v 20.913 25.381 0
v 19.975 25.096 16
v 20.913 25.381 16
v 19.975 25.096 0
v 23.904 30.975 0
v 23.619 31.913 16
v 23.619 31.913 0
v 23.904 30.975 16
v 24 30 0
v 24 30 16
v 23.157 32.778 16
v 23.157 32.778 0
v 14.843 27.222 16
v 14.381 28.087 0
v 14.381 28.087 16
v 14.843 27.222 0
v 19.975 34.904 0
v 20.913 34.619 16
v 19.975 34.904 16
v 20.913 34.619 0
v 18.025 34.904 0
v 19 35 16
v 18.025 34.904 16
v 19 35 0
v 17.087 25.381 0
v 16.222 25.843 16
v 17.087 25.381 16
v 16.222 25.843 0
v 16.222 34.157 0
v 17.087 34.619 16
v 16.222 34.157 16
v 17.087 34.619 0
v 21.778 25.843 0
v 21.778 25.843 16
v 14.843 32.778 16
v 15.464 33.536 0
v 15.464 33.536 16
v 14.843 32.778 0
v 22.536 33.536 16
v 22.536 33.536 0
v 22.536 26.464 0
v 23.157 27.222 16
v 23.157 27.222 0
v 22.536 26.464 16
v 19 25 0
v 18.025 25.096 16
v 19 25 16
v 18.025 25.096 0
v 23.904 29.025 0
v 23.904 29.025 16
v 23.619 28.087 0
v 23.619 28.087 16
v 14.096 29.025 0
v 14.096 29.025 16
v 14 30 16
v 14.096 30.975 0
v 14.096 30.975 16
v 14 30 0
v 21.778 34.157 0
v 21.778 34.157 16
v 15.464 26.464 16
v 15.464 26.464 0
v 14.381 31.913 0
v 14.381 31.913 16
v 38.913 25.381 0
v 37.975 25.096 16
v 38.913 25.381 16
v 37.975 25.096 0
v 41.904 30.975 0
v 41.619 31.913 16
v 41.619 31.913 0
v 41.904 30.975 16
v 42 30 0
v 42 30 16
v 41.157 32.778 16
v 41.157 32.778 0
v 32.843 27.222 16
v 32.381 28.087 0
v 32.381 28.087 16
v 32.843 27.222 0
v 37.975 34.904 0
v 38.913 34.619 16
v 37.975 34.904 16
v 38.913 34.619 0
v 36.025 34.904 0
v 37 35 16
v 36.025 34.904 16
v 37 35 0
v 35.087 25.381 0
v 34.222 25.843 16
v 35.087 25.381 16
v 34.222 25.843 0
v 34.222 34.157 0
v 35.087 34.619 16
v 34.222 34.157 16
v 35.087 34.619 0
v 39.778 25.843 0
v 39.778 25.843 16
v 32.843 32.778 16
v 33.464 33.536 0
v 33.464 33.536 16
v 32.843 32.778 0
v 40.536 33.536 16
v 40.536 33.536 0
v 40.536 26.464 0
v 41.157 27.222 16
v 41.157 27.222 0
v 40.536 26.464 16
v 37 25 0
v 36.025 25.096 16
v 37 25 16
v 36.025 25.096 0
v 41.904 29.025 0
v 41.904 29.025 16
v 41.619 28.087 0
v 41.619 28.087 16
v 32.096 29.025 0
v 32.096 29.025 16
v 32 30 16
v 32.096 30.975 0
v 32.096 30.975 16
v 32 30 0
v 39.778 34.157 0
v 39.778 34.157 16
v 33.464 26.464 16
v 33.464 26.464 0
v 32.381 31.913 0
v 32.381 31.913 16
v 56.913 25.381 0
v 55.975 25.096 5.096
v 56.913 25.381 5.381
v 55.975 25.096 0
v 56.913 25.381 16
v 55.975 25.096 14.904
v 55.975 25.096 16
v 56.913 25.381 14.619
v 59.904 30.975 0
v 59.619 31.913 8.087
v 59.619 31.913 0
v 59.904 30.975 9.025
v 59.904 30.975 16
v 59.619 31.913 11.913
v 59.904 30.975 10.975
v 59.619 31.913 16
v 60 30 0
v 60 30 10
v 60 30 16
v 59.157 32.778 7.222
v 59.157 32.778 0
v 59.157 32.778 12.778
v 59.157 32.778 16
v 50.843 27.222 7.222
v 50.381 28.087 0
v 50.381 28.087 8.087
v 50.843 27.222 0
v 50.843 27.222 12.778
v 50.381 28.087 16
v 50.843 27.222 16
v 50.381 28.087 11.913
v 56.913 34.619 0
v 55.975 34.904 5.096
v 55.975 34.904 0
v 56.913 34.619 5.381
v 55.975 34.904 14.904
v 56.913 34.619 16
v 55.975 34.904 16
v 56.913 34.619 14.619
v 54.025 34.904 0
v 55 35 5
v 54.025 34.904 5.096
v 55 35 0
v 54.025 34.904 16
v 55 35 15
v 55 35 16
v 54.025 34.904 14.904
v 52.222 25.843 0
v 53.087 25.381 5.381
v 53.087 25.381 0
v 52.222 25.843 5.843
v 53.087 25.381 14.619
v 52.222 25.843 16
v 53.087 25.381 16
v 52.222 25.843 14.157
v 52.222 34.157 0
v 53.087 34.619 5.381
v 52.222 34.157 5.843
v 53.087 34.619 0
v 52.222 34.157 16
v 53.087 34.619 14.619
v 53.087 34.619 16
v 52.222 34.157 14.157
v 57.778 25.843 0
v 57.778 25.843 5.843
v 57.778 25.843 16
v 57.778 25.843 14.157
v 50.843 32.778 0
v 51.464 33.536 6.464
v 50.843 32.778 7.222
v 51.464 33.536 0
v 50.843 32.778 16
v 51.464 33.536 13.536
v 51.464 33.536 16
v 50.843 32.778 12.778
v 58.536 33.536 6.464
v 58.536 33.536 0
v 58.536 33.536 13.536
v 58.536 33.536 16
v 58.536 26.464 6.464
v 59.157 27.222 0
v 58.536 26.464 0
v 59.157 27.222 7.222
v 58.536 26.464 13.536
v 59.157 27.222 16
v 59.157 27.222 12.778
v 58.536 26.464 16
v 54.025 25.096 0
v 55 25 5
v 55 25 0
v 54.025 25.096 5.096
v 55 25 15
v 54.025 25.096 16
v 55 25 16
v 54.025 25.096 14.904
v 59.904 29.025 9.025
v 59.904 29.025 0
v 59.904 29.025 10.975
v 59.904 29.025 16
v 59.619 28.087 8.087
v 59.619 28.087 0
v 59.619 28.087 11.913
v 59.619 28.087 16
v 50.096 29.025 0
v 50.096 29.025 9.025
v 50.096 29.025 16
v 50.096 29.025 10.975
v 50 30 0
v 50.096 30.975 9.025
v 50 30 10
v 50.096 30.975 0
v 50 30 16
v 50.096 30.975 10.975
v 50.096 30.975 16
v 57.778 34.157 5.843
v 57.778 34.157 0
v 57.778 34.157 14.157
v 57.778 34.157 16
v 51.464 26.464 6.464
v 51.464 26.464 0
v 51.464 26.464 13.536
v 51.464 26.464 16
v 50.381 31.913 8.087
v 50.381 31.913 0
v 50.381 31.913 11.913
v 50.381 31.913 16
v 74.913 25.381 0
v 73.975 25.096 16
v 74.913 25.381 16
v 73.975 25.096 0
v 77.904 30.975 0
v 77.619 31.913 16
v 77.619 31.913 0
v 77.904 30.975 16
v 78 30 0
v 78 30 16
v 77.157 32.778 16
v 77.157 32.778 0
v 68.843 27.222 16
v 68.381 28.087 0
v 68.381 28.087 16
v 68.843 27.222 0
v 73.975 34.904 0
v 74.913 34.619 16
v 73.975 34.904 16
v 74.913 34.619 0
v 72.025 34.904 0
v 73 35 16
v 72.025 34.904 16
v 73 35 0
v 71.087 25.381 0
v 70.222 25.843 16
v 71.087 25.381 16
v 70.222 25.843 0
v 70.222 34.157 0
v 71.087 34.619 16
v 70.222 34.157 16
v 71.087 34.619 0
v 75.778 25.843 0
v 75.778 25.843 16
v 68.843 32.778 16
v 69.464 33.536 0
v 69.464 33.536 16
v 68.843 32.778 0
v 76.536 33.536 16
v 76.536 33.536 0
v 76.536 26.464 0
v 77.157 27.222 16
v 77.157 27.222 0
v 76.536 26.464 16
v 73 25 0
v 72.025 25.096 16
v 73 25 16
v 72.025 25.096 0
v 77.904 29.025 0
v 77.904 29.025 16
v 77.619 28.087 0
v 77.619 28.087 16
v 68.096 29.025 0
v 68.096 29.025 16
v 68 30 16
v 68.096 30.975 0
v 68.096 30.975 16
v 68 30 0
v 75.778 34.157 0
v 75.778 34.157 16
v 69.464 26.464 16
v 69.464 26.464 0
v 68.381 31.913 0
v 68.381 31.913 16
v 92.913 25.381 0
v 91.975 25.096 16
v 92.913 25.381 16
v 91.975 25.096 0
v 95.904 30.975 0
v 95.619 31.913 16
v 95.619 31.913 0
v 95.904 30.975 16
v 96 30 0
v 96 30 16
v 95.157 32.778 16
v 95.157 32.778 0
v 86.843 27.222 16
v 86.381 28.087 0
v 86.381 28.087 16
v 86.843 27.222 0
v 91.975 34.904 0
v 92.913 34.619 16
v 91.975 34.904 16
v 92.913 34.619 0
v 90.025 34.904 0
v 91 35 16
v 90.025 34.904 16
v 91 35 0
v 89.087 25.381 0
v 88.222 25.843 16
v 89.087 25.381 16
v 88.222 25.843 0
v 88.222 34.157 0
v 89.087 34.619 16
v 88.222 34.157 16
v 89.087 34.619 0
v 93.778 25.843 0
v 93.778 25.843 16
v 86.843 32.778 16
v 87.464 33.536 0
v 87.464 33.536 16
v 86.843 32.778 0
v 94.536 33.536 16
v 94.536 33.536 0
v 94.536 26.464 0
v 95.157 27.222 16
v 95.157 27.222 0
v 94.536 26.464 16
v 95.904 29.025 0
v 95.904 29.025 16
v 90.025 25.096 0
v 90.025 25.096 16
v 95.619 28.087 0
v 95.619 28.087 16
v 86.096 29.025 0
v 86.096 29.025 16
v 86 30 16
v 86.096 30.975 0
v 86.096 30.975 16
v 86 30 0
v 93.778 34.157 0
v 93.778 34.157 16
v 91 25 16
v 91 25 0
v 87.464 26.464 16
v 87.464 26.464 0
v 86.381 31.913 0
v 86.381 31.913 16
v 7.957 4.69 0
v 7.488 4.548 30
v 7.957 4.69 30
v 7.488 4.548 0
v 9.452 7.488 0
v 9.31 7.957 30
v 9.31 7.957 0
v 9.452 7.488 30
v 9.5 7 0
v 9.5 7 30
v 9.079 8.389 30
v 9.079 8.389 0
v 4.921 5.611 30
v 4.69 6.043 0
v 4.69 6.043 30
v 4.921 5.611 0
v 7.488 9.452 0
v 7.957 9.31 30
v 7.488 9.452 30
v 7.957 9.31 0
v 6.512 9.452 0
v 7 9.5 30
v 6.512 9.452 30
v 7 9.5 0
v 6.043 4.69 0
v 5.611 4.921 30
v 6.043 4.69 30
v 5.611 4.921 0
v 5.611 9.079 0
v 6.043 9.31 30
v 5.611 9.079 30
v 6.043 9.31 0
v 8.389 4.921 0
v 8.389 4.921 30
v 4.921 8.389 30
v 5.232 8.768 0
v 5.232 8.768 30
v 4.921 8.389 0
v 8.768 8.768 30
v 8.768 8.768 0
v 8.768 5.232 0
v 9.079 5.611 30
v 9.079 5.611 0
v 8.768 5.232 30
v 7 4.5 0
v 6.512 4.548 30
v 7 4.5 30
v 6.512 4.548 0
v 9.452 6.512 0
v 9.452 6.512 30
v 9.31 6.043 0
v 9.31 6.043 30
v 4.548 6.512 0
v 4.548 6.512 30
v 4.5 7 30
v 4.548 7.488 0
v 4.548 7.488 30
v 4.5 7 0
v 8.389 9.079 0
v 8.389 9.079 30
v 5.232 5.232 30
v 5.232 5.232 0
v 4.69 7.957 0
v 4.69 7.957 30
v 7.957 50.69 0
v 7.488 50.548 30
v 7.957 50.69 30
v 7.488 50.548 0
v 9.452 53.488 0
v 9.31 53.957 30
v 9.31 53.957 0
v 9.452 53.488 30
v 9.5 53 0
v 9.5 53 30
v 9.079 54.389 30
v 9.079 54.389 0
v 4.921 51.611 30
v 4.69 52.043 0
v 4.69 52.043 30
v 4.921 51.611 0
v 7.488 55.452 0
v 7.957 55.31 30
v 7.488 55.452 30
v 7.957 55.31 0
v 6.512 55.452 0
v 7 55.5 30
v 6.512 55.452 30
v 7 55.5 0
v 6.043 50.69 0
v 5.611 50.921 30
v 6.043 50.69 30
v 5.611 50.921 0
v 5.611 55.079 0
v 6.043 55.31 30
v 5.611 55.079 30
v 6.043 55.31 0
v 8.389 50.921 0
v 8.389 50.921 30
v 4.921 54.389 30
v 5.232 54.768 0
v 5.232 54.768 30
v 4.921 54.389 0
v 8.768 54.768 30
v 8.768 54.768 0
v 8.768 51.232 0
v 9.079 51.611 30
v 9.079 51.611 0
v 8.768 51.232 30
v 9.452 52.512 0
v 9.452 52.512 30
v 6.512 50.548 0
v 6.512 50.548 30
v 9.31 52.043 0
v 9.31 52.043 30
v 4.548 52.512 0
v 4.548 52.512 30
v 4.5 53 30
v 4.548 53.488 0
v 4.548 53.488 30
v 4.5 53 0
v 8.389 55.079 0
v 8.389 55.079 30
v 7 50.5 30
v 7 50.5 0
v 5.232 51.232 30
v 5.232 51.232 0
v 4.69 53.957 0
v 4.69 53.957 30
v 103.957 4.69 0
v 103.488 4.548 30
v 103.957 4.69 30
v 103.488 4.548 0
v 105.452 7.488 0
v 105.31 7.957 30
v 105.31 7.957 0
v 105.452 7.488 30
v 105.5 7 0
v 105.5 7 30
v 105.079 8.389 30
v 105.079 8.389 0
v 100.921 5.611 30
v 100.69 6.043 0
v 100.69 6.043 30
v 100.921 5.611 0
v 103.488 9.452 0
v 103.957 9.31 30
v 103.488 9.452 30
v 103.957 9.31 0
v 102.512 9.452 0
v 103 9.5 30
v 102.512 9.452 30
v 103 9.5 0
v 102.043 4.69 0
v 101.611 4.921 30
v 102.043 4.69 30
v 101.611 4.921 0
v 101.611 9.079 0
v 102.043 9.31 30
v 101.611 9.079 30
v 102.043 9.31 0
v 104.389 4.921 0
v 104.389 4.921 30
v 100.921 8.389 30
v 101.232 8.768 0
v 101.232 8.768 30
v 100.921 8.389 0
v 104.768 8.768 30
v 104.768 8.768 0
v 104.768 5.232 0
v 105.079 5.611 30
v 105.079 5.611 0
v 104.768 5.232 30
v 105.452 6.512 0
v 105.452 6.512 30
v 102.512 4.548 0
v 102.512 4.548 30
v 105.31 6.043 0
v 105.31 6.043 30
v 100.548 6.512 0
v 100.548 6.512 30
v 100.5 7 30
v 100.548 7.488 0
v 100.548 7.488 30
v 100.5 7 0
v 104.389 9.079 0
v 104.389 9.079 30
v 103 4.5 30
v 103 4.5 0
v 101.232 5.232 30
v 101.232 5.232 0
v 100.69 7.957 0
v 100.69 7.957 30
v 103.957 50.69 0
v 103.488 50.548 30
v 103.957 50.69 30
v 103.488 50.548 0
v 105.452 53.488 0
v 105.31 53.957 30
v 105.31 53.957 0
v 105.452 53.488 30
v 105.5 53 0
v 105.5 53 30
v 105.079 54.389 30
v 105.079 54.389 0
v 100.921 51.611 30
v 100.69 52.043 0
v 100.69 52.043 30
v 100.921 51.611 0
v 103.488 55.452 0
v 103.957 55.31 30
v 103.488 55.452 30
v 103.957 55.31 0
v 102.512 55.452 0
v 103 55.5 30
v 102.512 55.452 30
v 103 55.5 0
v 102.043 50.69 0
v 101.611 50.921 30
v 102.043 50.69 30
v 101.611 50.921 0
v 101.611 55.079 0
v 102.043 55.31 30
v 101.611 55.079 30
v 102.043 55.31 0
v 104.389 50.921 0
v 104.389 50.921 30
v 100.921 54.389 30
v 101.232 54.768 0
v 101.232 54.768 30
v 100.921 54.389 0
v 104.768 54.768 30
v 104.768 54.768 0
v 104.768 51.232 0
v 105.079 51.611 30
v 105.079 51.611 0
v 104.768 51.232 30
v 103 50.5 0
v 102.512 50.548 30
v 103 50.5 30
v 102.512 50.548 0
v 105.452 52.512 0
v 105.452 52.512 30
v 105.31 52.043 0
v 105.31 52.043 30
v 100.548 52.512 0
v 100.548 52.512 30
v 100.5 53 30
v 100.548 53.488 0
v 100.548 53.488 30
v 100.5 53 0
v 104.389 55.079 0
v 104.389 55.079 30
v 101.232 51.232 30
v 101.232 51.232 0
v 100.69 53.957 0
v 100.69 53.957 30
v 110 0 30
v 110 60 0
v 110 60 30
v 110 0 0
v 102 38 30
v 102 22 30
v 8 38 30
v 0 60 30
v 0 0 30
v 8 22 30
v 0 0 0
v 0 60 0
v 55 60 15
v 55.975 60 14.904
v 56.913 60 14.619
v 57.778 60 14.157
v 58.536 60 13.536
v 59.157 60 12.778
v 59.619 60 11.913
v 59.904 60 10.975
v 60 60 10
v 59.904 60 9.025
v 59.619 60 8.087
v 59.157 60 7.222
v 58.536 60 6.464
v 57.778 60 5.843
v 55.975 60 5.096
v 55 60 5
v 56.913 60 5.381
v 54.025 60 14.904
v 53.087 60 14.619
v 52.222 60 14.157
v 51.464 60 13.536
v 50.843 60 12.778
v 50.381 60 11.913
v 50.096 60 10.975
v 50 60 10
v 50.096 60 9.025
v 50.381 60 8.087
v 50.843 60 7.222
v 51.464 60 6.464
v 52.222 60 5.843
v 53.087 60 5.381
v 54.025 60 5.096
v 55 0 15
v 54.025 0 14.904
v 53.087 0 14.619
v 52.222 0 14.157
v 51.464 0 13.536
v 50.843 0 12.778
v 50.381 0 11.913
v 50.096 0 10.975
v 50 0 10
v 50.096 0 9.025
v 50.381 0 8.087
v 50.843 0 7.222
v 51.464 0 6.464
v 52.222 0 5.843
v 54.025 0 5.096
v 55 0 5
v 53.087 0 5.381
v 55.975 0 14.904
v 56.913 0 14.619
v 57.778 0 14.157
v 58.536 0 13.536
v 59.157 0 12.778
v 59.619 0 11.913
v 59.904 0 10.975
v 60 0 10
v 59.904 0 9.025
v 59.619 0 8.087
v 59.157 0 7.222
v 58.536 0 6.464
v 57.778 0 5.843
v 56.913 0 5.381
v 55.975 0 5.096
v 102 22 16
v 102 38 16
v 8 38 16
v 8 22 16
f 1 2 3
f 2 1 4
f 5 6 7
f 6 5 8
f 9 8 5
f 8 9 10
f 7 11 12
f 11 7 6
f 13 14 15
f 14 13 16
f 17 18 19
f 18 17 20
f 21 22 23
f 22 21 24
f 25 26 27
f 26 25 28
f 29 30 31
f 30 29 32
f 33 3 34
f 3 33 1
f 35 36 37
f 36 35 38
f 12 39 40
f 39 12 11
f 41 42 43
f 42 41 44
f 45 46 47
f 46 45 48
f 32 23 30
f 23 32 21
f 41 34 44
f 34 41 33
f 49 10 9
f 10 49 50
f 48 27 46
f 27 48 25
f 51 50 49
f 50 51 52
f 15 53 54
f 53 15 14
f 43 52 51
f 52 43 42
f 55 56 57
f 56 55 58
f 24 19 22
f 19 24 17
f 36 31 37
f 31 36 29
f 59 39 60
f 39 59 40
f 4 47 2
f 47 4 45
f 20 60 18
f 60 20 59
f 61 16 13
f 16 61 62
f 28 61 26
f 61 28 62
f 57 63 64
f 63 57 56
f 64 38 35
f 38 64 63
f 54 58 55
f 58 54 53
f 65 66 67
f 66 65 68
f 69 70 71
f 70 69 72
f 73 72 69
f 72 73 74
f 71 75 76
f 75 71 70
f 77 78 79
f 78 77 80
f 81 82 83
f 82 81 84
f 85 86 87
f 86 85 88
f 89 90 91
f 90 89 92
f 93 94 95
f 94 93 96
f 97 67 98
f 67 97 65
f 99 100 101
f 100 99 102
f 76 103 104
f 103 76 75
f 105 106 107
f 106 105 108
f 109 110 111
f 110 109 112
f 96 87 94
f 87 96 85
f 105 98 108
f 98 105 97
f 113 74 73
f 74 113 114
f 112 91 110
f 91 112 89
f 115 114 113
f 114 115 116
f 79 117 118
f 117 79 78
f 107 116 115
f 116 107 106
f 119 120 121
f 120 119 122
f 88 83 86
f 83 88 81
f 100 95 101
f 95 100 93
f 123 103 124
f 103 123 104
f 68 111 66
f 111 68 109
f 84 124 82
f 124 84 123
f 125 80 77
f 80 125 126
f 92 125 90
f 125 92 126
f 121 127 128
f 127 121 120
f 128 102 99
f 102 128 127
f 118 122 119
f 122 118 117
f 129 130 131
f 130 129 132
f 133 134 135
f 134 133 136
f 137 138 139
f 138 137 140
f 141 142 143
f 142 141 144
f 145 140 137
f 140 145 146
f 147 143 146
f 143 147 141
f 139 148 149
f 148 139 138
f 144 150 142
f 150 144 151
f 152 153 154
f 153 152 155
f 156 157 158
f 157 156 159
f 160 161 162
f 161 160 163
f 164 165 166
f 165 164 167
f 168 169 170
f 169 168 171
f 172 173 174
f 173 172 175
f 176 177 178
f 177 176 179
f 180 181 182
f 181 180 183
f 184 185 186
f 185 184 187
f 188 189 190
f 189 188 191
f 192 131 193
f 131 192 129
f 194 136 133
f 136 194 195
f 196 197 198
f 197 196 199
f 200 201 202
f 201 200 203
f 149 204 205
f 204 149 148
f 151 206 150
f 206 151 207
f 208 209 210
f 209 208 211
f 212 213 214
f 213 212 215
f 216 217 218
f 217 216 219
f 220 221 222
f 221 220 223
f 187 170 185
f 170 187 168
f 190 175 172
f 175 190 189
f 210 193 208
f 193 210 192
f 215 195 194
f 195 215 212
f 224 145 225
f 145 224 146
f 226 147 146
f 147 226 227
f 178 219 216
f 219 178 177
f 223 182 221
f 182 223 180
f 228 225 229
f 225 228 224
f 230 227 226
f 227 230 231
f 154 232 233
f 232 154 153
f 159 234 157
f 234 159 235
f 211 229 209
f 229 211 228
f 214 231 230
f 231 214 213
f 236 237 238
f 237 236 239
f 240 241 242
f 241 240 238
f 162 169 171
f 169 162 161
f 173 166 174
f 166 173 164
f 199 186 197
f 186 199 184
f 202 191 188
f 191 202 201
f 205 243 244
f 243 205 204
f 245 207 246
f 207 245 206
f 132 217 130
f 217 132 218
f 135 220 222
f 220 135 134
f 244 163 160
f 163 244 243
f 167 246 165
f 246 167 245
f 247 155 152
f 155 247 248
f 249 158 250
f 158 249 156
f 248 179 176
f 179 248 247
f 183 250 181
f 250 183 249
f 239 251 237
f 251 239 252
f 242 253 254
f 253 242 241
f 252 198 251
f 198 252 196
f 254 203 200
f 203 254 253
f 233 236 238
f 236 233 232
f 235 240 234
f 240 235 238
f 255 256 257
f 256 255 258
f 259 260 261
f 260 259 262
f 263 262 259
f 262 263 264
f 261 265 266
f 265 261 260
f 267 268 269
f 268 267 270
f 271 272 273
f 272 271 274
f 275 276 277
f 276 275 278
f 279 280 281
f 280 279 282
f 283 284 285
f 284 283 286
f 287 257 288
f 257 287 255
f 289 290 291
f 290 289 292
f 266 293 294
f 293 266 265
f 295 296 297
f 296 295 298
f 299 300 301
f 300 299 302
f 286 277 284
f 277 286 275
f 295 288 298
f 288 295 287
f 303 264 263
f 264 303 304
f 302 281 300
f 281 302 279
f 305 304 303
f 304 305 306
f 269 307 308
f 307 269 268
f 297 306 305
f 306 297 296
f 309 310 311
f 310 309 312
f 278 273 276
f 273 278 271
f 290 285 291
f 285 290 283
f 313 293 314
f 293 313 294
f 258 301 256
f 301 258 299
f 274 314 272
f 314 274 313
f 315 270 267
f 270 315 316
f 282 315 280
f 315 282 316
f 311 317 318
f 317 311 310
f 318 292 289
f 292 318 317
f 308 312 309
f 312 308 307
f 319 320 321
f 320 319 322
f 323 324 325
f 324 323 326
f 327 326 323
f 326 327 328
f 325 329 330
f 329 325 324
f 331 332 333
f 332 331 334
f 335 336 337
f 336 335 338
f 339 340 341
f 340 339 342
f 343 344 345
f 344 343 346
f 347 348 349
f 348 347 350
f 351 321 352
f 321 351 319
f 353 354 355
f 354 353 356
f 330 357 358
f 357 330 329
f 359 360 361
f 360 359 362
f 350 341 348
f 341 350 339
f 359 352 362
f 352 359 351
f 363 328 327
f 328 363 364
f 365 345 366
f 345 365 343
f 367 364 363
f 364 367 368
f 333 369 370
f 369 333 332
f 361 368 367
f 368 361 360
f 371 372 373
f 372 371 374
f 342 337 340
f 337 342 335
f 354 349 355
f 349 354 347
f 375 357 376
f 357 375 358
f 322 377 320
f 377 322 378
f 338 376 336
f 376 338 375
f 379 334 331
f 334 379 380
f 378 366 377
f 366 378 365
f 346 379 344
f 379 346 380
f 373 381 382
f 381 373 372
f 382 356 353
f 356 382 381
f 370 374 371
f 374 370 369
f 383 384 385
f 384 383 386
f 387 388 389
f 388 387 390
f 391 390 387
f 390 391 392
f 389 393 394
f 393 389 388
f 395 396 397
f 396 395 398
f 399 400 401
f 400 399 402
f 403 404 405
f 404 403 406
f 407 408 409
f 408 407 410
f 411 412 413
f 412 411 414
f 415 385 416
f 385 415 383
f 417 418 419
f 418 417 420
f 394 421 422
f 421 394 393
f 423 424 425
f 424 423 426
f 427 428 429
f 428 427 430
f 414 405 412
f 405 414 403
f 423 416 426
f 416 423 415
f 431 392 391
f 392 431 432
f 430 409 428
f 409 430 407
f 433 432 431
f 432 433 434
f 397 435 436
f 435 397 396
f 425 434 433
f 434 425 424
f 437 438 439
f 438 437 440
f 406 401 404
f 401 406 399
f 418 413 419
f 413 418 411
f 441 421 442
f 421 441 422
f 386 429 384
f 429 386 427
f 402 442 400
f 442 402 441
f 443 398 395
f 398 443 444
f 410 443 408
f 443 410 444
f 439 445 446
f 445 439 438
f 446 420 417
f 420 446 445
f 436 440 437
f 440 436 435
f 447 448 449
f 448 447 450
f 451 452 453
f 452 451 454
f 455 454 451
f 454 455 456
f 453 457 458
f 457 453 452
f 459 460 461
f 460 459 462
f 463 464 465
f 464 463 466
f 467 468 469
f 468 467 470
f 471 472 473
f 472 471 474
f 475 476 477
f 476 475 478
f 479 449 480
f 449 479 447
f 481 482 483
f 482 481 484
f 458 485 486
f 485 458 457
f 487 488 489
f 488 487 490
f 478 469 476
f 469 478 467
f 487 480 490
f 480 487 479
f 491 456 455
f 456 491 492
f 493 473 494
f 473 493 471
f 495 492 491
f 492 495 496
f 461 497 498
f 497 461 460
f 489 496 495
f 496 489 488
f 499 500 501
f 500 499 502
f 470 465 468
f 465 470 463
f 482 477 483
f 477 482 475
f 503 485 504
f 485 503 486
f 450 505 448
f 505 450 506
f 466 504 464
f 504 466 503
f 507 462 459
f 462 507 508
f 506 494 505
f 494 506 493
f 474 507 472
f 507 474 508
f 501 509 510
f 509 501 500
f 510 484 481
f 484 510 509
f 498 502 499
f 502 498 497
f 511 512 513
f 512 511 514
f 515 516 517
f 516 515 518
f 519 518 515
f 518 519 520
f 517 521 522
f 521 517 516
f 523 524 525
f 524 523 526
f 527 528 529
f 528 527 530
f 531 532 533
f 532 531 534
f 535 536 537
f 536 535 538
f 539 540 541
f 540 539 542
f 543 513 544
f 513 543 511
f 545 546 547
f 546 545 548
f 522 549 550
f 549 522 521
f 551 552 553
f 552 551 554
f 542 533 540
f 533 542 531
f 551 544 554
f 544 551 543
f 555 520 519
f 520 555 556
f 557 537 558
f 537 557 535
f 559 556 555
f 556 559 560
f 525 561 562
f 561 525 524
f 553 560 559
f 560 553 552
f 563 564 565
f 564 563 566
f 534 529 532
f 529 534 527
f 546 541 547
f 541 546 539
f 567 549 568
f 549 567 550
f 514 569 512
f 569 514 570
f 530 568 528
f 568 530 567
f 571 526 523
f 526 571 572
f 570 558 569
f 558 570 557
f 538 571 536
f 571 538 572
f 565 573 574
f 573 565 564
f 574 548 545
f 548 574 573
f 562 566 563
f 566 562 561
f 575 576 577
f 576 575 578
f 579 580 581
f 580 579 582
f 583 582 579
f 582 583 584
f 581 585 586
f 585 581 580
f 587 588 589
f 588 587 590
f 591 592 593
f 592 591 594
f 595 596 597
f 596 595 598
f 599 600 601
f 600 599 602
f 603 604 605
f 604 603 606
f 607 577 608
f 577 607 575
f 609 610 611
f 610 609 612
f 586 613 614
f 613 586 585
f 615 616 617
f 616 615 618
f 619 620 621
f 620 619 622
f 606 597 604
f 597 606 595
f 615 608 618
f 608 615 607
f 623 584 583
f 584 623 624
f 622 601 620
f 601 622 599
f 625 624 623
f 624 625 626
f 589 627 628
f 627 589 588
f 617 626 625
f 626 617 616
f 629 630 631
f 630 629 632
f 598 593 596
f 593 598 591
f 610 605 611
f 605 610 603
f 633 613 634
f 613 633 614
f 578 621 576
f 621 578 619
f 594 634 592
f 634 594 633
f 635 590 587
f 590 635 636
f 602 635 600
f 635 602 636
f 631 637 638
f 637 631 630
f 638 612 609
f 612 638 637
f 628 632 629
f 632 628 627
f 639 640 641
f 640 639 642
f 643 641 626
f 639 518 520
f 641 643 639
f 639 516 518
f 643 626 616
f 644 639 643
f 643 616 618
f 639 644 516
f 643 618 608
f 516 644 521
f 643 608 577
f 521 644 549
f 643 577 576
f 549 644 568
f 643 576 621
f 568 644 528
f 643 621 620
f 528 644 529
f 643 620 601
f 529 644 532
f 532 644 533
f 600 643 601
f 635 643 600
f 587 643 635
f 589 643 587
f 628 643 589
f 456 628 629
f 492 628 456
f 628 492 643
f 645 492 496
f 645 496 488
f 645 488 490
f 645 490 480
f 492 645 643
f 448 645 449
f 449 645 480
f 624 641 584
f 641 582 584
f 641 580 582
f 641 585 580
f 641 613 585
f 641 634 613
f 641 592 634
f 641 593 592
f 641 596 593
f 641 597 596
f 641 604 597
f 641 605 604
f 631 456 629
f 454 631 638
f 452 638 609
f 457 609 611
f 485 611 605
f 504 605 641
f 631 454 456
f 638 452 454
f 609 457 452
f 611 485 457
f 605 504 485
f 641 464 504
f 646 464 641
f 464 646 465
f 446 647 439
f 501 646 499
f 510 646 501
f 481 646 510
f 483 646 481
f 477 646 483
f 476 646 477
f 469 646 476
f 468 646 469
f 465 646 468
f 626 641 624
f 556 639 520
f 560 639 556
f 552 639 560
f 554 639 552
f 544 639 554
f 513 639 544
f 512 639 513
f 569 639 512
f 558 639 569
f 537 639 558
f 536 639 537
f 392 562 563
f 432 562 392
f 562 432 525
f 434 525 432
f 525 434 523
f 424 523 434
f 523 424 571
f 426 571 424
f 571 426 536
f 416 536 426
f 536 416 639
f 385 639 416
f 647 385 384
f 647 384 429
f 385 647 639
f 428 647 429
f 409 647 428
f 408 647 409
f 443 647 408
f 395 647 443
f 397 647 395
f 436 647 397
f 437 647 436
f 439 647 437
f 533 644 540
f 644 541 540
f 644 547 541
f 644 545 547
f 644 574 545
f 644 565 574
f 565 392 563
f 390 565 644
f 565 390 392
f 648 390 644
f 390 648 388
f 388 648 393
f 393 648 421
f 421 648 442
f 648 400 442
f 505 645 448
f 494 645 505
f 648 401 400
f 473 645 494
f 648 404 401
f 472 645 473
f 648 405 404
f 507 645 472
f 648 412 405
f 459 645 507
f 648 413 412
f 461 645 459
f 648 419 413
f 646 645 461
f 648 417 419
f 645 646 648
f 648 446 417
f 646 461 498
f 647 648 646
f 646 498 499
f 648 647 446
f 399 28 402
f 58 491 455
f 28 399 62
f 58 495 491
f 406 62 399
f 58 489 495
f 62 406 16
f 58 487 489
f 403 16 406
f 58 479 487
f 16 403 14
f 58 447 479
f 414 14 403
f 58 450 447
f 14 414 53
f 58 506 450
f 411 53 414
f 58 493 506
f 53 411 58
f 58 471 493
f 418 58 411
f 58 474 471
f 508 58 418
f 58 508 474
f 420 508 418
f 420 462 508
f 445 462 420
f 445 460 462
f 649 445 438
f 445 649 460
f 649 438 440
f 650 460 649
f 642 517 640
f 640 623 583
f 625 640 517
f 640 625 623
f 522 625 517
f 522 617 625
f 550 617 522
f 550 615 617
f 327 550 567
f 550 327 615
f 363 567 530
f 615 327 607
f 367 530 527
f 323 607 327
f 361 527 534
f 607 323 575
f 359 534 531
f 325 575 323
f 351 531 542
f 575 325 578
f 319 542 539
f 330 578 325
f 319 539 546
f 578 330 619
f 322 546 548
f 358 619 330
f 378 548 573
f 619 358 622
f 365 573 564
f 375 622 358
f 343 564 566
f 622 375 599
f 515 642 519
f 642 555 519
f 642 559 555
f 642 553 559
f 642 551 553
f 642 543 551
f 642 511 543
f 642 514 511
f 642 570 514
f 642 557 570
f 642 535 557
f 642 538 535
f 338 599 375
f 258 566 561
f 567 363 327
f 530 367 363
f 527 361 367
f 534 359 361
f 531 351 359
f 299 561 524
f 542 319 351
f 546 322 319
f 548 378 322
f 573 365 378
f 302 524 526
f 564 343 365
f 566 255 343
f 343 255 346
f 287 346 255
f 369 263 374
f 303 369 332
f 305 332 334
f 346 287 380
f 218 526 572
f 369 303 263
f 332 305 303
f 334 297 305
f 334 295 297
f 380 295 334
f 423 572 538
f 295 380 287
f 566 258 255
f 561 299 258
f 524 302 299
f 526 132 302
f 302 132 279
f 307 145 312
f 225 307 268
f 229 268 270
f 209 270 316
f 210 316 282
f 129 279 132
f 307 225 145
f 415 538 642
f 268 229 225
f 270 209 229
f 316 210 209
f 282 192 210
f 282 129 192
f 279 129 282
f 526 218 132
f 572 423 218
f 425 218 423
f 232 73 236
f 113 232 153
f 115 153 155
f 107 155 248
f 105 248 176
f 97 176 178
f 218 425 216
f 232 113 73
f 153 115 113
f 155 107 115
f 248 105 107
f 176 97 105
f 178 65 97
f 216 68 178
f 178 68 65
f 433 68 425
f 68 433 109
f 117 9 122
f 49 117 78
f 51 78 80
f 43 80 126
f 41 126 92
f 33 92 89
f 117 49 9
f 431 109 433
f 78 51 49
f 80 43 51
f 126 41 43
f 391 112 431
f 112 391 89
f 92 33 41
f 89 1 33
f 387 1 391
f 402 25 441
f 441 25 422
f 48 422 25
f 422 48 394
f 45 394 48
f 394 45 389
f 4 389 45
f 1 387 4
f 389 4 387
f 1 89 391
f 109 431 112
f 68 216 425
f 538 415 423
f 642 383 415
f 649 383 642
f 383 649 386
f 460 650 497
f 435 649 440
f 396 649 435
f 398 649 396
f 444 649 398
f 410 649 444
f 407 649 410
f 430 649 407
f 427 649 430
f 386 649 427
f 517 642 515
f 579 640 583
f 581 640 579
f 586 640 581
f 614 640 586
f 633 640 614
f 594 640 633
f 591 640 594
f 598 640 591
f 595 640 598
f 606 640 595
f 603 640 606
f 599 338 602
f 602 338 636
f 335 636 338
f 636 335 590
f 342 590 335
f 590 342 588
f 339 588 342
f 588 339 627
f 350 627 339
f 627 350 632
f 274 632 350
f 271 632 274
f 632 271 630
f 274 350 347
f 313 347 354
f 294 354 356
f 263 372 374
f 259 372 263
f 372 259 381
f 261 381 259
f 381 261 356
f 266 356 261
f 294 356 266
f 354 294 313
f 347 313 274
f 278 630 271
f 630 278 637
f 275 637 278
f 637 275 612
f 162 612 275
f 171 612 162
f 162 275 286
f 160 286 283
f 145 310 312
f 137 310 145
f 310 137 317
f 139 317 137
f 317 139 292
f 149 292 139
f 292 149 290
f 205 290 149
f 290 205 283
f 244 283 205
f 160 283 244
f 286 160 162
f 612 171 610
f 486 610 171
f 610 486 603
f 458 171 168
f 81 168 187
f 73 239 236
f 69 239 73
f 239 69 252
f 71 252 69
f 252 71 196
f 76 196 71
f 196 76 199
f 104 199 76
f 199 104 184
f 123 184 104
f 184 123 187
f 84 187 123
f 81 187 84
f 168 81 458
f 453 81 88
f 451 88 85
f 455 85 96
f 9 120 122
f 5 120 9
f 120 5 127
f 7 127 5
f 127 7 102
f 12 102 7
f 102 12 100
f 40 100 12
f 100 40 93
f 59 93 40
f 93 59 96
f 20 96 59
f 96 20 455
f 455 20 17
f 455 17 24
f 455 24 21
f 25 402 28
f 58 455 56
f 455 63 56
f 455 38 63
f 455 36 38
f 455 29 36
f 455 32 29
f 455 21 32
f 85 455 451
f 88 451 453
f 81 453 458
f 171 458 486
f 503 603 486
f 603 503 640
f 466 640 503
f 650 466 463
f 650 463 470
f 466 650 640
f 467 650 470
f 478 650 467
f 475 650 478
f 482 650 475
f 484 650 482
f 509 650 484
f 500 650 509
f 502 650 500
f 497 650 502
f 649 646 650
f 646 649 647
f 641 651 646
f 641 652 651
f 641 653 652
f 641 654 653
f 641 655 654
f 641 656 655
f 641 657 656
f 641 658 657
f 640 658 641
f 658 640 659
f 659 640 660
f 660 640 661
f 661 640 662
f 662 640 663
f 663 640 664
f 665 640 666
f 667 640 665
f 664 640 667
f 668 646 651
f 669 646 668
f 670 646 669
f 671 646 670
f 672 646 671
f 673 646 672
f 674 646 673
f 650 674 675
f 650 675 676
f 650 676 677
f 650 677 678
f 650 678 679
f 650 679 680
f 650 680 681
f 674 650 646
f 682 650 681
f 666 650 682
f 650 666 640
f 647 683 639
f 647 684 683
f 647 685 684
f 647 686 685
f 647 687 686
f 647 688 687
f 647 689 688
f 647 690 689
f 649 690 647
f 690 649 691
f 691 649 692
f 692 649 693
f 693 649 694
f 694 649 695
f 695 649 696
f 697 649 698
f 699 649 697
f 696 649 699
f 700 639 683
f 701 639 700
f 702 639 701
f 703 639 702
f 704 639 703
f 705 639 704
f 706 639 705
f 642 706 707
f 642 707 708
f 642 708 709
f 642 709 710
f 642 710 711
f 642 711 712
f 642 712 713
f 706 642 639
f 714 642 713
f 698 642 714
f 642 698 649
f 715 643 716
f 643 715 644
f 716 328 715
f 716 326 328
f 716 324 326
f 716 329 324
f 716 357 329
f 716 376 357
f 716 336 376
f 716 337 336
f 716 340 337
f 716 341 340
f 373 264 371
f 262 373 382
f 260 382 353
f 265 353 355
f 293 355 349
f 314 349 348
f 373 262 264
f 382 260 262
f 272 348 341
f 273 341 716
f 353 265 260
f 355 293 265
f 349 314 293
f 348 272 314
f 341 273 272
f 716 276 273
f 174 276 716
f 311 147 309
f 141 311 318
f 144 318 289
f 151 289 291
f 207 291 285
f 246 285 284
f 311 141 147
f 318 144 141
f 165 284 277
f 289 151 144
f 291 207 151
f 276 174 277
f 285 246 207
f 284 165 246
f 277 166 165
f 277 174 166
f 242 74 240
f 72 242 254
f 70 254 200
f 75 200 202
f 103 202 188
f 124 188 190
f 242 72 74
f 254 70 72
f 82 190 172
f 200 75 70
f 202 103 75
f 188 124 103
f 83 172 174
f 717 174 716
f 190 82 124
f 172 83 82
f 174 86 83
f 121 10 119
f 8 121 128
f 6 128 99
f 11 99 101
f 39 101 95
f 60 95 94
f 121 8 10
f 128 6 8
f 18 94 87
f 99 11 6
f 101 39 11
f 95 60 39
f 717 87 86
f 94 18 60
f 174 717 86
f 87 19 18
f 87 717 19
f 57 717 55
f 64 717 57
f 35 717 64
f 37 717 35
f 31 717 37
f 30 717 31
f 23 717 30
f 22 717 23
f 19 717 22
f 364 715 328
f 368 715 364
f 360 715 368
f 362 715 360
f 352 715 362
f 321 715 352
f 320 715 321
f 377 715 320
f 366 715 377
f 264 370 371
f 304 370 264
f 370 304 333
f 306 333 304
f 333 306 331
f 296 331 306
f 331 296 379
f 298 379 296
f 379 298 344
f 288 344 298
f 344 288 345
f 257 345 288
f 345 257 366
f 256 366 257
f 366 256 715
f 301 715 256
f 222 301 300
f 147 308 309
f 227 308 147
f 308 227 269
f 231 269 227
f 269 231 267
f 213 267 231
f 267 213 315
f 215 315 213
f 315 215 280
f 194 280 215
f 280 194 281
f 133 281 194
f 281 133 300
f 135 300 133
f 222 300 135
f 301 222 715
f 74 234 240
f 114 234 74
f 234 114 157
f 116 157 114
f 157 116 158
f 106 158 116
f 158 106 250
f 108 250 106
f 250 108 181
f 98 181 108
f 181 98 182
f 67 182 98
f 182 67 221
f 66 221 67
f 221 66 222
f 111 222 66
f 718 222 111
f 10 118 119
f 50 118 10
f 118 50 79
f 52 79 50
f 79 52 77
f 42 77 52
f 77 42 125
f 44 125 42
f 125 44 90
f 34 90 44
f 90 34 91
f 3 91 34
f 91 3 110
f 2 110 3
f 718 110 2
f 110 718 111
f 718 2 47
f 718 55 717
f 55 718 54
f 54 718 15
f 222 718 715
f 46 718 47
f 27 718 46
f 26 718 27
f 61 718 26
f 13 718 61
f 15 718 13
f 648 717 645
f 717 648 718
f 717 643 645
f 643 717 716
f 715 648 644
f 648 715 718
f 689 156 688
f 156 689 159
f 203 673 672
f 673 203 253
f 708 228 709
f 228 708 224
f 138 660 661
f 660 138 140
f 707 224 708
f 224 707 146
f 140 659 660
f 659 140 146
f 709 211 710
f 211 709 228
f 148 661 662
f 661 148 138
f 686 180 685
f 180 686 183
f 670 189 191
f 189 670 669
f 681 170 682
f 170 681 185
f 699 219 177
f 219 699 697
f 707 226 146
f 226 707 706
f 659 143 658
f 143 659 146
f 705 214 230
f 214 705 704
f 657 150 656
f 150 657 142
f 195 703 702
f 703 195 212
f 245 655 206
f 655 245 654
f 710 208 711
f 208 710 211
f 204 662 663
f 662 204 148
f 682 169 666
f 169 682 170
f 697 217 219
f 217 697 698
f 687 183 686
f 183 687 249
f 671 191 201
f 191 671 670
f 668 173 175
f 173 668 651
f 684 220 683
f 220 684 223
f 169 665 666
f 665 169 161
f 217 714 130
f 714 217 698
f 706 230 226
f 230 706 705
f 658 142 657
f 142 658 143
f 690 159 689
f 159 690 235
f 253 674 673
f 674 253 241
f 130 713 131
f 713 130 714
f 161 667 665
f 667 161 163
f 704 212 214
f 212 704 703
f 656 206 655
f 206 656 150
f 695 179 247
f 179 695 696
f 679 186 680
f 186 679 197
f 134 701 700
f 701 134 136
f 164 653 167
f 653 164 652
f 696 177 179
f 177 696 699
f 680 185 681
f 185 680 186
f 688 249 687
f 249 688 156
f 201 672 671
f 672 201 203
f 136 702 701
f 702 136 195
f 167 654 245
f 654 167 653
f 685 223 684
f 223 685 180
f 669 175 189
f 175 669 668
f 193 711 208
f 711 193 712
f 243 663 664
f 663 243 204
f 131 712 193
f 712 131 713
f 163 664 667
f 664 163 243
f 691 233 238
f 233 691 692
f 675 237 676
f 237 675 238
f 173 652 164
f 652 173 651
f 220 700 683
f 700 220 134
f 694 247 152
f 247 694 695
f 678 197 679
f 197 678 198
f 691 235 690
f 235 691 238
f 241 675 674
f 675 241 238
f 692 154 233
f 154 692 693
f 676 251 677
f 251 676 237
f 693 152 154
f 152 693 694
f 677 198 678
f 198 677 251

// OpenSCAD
$fn = 32;

// ----------------------------------------------------------------------
// Manifold block: side_outlet manifold
// ----------------------------------------------------------------------

// --- parameters (mm) ---
block_l = 110;            // block length, X
block_w = 60;             // block width, Y
block_h = 30;             // block height, Z
port_d = 10;              // port bore diameter
port_pitch = 18;          // port pitch along X
gallery_d = 16;           // top gallery width, Y
gallery_depth = 14;       // gallery pocket depth
wall_p = 8;               // gallery end wall thickness, X
mnt_d = 5;                // mounting hole diameter
mnt_in = 7;               // mounting hole inset from the edges
out_d = 10;               // outlet bore diameter
out_z = 10;               // outlet axis height
fit_tol = 0.02;           // tolerance for press fits, mm
free_tol = 0.2;           // tolerance for clearance fits, mm

n_ports = 5;  // ports in the row
port_x0 = (block_l - (n_ports - 1) * port_pitch) / 2;  // first port X

difference() {
  cube([block_l, block_w, block_h]);
  for (i = [0 : n_ports - 1])
    translate([port_x0 + i * port_pitch, block_w / 2, -1])
      cylinder(h = block_h + 2, d = port_d);
  translate([wall_p, block_w / 2 - gallery_d / 2, block_h - gallery_depth])
    cube([block_l - 2 * wall_p, gallery_d, gallery_depth + 1]);
  for (cx = [mnt_in, block_l - mnt_in])
    for (cy = [mnt_in, block_w - mnt_in])
      translate([cx, cy, -1]) cylinder(h = block_h + 2, d = mnt_d);
  translate([block_l / 2, -1, out_z]) rotate([-90, 0, 0])
    cylinder(h = block_w + 2, d = out_d);
}
